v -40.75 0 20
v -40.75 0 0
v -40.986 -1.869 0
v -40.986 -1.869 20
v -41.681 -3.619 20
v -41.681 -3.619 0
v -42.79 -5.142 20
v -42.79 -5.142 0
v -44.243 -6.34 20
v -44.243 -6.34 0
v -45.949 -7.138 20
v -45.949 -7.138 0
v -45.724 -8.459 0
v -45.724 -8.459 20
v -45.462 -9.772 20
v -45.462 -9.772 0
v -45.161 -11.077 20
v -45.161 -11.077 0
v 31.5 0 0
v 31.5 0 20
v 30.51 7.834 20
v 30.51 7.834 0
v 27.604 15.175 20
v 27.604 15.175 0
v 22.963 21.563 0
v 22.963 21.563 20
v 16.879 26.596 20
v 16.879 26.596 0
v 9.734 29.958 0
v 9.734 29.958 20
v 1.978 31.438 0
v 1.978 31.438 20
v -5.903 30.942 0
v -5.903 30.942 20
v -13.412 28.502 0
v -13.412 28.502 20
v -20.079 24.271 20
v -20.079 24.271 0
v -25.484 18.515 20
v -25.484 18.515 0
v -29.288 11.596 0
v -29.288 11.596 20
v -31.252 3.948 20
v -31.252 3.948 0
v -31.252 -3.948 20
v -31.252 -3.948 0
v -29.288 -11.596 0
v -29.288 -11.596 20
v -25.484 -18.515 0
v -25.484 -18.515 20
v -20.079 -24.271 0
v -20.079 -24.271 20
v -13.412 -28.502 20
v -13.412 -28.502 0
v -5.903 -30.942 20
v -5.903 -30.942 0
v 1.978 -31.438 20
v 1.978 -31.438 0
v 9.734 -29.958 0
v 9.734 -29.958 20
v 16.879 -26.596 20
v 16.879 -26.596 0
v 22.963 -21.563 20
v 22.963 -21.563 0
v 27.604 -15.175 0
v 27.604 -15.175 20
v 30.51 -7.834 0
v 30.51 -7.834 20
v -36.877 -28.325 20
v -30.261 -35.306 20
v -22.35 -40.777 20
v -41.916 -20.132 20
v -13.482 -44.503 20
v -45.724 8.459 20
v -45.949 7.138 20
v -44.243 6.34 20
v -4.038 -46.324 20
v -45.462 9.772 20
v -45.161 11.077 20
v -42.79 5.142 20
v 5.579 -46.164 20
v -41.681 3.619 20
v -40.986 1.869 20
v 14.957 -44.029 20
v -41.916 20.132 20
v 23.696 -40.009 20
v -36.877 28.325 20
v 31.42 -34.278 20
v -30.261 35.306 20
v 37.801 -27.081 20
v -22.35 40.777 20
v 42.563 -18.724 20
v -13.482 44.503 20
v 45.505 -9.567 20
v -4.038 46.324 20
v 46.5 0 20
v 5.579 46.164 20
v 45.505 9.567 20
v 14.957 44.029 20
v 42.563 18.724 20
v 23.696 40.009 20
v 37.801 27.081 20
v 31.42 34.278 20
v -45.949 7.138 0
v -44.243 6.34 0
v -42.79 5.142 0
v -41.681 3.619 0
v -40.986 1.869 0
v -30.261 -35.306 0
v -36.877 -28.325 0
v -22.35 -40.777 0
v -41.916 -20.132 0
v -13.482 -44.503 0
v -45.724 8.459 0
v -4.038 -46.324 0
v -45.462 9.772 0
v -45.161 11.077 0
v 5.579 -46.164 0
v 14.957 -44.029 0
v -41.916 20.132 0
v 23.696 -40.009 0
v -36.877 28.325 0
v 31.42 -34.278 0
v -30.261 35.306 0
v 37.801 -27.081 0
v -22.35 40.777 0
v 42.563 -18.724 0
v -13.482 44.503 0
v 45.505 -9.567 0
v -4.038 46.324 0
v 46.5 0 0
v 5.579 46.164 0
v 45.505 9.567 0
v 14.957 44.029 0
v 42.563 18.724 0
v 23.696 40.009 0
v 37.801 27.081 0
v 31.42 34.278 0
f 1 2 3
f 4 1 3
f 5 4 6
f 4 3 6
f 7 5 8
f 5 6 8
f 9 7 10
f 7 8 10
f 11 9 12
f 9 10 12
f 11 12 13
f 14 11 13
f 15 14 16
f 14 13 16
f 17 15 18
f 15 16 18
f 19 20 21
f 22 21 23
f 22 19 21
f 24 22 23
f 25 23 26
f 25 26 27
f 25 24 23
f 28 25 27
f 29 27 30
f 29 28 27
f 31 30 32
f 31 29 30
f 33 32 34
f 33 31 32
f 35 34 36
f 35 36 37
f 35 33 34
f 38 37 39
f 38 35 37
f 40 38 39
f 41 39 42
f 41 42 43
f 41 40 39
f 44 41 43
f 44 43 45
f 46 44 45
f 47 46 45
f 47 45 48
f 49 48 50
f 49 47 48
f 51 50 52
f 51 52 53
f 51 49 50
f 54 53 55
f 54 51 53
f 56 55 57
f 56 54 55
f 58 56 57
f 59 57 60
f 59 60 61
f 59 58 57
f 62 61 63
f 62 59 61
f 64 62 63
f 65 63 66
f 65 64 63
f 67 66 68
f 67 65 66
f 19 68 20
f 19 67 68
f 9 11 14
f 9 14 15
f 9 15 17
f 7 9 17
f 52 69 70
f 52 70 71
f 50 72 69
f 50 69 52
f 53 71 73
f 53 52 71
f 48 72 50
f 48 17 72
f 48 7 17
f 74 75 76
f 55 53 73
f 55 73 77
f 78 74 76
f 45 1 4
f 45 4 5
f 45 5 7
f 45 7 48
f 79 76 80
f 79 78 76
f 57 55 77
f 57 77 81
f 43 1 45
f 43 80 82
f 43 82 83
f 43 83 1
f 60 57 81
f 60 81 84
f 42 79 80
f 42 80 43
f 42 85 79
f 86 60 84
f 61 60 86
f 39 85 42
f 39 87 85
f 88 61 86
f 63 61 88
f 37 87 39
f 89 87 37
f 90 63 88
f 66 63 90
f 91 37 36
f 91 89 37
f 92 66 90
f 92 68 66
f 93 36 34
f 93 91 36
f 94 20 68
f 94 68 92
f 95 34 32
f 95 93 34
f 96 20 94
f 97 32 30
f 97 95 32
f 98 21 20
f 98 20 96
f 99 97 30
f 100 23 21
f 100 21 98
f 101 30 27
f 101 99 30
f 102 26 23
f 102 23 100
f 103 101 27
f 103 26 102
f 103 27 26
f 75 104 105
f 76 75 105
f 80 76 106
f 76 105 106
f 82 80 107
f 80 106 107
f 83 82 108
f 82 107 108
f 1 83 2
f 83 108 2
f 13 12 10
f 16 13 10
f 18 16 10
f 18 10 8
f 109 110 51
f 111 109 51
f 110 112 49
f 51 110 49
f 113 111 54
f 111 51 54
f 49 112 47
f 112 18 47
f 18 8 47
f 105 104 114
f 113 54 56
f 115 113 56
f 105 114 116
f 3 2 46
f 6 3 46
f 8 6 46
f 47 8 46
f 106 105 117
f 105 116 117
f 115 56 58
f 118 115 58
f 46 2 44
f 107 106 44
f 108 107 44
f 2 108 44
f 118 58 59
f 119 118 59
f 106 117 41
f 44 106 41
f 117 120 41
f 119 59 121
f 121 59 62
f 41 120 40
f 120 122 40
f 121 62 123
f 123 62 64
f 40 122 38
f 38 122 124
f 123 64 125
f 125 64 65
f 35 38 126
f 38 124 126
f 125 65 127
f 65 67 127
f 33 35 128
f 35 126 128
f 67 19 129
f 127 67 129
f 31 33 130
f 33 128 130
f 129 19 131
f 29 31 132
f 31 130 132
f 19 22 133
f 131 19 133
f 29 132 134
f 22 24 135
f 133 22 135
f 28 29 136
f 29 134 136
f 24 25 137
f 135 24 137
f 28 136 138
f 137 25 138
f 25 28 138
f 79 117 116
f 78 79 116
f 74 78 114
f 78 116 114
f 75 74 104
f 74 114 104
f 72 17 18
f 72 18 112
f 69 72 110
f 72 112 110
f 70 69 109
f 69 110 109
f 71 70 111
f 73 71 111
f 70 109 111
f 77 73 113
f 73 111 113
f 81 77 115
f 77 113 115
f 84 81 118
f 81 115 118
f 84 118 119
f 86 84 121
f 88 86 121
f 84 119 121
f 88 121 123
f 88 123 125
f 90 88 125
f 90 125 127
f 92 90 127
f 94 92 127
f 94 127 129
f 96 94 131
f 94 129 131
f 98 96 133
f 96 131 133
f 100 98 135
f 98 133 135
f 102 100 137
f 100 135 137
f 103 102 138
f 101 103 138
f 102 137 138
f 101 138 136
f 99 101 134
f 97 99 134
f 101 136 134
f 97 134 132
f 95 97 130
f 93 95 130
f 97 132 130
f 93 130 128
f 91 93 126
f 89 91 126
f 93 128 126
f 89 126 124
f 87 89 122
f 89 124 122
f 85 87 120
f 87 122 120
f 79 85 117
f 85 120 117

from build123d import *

# Parameters (mm, degrees)
F0_R     = 31.5
F1_DEPTH = 20


with BuildPart() as f1:
    # F0 (on Top) → F1 (new body)
    with BuildSketch(Plane.XY):
        with BuildLine():
            ThreePointArc((-36.75, 0), (-39.0911135624, 6.9544805142), (-45.1612694301, 11.0774430022))
            ThreePointArc((-45.1612694301, 11.0774430022), (-45.5976101671, 9.1163560183), (-45.9488341969, 7.1382516029))
            ThreePointArc((-45.9488341969, 7.1382516029), (-42.1874616074, 4.4153854009), (-40.75, 0))
            ThreePointArc((-40.75, 0), (-42.1874616074, -4.4153854009), (-45.9488341969, -7.1382516029))
            ThreePointArc((-45.9488341969, -7.1382516029), (-45.5976101671, -9.1163560183), (-45.1612694301, -11.0774430022))
            ThreePointArc((-45.1612694301, -11.0774430022), (-39.0911135624, -6.9544805142), (-36.75, 0))
        make_face()
        with BuildLine():
            ThreePointArc((-45.1612694301, -11.0774430022), (5.579021935, -46.1641041747), (46.5, 0))
            ThreePointArc((46.5, 0), (5.579021935, 46.1641041747), (-45.1612694301, 11.0774430022))
            ThreePointArc((-45.1612694301, 11.0774430022), (-39.0911135624, 6.9544805142), (-36.75, 0))
            ThreePointArc((-36.75, 0), (-39.0911135624, -6.9544805142), (-45.1612694301, -11.0774430022))
        make_face()
        Circle(F0_R, mode=Mode.SUBTRACT)
    extrude(amount=F1_DEPTH)


solid = f1.part
